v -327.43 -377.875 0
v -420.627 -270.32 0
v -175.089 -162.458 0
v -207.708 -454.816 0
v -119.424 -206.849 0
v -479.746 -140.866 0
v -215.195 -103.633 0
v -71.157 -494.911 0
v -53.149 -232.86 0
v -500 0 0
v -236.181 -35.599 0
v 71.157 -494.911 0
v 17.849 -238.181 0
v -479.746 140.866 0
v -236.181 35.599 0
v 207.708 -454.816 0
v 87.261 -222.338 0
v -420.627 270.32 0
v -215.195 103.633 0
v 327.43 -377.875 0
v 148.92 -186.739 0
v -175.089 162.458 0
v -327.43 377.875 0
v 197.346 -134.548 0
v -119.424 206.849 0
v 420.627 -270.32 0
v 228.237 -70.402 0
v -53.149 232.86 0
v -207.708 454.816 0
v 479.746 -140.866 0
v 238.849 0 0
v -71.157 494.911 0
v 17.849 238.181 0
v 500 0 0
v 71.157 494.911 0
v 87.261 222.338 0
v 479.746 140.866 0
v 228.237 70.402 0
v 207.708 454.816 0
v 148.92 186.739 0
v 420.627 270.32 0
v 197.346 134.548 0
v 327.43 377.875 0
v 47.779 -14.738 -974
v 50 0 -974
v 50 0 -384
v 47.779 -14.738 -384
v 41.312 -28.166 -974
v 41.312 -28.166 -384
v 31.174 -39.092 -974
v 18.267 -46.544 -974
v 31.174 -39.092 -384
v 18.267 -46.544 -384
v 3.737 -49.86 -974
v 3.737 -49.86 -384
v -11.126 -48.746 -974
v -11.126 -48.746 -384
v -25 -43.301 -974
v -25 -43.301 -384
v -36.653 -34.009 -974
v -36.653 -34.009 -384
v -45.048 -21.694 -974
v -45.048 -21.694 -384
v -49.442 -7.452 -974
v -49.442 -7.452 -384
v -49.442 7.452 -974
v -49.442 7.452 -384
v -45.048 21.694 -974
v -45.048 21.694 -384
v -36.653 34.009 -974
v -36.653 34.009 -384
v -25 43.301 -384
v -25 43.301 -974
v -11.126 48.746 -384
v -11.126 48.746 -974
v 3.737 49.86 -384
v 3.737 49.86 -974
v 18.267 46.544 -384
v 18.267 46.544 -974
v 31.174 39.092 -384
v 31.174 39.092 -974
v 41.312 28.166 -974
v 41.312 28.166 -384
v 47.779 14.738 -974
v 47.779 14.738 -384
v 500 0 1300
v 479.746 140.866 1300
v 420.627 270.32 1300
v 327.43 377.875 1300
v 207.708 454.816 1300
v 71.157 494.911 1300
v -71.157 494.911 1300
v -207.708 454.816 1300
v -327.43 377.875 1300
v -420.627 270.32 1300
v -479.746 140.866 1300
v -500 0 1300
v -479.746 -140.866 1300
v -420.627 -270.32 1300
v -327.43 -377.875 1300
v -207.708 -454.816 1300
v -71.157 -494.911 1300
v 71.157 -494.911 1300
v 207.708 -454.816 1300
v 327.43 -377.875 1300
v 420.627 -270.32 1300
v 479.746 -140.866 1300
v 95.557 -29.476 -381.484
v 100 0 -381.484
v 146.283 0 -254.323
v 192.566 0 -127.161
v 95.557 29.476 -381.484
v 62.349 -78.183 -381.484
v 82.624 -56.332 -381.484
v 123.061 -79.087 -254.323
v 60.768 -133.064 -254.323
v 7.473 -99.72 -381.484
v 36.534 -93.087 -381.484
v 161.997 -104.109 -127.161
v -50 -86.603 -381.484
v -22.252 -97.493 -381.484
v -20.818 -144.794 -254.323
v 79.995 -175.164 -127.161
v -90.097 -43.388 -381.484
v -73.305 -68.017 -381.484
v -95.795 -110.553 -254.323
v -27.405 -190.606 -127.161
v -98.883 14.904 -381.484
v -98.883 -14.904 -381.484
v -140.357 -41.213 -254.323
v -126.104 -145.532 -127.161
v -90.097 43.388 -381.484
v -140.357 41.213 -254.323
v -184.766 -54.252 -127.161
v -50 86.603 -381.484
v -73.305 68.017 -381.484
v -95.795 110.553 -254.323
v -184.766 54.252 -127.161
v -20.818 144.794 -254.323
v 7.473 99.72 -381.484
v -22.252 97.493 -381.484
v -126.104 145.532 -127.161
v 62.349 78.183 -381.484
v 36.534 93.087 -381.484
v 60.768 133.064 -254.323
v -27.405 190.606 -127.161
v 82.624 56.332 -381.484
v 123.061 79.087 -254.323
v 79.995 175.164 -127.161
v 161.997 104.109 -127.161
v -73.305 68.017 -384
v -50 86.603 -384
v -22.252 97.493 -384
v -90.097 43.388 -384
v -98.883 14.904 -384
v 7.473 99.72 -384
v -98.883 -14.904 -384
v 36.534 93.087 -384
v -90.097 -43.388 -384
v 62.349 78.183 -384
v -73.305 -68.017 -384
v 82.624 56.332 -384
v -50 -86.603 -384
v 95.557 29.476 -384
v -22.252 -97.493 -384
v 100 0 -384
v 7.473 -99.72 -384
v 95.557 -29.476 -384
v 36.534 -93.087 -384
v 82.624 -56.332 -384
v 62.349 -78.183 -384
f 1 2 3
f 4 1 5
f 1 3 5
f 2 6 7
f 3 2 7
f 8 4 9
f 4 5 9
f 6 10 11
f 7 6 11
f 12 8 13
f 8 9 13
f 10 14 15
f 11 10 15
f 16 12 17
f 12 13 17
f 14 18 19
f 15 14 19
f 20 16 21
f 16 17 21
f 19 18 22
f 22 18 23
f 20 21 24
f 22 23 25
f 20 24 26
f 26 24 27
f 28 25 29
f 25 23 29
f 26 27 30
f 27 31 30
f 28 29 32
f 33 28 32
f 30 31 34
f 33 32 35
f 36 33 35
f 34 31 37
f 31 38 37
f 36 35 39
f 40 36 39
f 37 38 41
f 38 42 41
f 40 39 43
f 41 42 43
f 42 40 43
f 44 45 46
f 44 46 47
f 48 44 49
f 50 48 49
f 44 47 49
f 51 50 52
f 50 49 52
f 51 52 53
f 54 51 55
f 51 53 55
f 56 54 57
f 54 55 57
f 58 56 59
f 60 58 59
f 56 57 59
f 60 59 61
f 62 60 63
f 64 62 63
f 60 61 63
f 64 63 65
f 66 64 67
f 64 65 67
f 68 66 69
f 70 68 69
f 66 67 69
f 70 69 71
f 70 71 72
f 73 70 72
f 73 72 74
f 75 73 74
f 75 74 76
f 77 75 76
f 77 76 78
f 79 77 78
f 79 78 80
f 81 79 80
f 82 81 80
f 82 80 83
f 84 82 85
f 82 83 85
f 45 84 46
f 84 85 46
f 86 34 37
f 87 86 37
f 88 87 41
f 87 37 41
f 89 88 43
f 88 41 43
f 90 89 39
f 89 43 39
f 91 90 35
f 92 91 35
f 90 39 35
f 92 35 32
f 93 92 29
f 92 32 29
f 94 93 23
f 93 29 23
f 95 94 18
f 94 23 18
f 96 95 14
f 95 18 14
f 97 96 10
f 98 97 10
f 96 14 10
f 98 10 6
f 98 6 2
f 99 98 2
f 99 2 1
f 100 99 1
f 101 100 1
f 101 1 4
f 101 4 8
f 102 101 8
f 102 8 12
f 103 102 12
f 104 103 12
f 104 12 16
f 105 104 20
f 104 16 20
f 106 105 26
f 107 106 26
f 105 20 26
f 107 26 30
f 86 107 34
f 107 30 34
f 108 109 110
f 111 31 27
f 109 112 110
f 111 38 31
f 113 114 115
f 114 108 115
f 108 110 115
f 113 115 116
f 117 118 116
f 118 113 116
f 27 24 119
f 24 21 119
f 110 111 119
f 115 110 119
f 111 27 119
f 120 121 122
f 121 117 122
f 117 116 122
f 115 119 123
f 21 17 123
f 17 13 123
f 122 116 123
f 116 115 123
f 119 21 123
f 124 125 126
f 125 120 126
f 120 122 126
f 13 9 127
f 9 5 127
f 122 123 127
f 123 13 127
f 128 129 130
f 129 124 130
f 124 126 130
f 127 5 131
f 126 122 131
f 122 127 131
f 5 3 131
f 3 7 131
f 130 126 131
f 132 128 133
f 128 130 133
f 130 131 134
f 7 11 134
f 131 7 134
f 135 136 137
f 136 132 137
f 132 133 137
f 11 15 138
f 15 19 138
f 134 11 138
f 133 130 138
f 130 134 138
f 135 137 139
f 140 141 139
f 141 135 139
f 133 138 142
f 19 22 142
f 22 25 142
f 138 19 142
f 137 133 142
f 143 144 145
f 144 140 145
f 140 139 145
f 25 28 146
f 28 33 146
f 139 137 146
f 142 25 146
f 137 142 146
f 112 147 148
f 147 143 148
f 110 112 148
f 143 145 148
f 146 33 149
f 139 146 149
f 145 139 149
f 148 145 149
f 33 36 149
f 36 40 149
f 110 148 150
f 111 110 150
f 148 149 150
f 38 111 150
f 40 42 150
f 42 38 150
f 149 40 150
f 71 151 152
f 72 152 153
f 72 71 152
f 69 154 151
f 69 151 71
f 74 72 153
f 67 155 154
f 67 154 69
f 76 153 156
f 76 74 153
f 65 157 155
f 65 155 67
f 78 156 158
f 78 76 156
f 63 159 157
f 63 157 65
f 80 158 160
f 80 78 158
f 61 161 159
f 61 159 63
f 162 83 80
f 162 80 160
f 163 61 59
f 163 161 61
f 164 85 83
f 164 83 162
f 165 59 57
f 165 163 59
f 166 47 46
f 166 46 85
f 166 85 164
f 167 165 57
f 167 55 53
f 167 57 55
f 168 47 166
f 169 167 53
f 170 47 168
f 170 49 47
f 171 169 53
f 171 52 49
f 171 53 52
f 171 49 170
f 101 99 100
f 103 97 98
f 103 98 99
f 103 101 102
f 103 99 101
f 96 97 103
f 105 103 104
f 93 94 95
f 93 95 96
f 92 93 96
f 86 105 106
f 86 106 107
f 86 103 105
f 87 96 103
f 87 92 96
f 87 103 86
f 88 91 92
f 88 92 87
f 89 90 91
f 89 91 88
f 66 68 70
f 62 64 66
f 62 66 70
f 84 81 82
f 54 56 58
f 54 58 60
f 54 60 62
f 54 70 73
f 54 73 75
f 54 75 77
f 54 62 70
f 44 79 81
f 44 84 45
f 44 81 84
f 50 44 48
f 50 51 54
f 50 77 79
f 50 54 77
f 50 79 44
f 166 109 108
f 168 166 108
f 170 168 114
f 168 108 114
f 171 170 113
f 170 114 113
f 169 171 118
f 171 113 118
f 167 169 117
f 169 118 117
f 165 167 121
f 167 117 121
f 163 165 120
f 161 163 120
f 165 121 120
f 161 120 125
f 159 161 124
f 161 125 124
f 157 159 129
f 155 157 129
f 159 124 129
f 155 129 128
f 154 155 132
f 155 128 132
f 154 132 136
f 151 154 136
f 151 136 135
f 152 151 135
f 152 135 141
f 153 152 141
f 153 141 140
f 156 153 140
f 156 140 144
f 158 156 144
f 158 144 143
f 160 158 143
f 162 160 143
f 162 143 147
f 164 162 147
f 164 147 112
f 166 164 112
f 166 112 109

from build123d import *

# Parameters (mm, degrees)
F0_R      = 500
F1_DEPTH  = 1300
F5_R      = 100
F6_DEPTH  = 809
F7_R      = 100
F8_DEPTH  = 384
F9_R      = 50
F10_DEPTH = 590


with BuildPart() as f1:
    # F0 (on Top) → F1 (new body)
    with BuildSketch(Plane.XY):
        Circle(F0_R)
    extrude(amount=F1_DEPTH)

    # F3 (on Front) → F4 (revolve)
    with BuildSketch(Plane.XZ):
        Polygon((0, 0), (0, -656.231495), (238.848731, 0), align=None)
    revolve(axis=Axis((0, 0, -328.115747), (0, 0, -1)))

    # F5 (on face) → F6 (cut)
    with BuildSketch(Plane(origin=(0, 0, 0), x_dir=(1, 0, 0), z_dir=(0, 0, -1))):
        Circle(F5_R)
    extrude(amount=F6_DEPTH, mode=Mode.SUBTRACT)

    # F7 (on face) → F8 (join)
    with BuildSketch(Plane(origin=(0, 0, 0), x_dir=(1, 0, 0), z_dir=(0, 0, -1))):
        Circle(F7_R)
    extrude(amount=F8_DEPTH)

    # F9 (on face) → F10 (join)
    with BuildSketch(Plane(origin=(0, 0, -384), x_dir=(1, 0, 0), z_dir=(0, 0, -1))):
        Circle(F9_R)
    extrude(amount=F10_DEPTH)


solid = f1.part
